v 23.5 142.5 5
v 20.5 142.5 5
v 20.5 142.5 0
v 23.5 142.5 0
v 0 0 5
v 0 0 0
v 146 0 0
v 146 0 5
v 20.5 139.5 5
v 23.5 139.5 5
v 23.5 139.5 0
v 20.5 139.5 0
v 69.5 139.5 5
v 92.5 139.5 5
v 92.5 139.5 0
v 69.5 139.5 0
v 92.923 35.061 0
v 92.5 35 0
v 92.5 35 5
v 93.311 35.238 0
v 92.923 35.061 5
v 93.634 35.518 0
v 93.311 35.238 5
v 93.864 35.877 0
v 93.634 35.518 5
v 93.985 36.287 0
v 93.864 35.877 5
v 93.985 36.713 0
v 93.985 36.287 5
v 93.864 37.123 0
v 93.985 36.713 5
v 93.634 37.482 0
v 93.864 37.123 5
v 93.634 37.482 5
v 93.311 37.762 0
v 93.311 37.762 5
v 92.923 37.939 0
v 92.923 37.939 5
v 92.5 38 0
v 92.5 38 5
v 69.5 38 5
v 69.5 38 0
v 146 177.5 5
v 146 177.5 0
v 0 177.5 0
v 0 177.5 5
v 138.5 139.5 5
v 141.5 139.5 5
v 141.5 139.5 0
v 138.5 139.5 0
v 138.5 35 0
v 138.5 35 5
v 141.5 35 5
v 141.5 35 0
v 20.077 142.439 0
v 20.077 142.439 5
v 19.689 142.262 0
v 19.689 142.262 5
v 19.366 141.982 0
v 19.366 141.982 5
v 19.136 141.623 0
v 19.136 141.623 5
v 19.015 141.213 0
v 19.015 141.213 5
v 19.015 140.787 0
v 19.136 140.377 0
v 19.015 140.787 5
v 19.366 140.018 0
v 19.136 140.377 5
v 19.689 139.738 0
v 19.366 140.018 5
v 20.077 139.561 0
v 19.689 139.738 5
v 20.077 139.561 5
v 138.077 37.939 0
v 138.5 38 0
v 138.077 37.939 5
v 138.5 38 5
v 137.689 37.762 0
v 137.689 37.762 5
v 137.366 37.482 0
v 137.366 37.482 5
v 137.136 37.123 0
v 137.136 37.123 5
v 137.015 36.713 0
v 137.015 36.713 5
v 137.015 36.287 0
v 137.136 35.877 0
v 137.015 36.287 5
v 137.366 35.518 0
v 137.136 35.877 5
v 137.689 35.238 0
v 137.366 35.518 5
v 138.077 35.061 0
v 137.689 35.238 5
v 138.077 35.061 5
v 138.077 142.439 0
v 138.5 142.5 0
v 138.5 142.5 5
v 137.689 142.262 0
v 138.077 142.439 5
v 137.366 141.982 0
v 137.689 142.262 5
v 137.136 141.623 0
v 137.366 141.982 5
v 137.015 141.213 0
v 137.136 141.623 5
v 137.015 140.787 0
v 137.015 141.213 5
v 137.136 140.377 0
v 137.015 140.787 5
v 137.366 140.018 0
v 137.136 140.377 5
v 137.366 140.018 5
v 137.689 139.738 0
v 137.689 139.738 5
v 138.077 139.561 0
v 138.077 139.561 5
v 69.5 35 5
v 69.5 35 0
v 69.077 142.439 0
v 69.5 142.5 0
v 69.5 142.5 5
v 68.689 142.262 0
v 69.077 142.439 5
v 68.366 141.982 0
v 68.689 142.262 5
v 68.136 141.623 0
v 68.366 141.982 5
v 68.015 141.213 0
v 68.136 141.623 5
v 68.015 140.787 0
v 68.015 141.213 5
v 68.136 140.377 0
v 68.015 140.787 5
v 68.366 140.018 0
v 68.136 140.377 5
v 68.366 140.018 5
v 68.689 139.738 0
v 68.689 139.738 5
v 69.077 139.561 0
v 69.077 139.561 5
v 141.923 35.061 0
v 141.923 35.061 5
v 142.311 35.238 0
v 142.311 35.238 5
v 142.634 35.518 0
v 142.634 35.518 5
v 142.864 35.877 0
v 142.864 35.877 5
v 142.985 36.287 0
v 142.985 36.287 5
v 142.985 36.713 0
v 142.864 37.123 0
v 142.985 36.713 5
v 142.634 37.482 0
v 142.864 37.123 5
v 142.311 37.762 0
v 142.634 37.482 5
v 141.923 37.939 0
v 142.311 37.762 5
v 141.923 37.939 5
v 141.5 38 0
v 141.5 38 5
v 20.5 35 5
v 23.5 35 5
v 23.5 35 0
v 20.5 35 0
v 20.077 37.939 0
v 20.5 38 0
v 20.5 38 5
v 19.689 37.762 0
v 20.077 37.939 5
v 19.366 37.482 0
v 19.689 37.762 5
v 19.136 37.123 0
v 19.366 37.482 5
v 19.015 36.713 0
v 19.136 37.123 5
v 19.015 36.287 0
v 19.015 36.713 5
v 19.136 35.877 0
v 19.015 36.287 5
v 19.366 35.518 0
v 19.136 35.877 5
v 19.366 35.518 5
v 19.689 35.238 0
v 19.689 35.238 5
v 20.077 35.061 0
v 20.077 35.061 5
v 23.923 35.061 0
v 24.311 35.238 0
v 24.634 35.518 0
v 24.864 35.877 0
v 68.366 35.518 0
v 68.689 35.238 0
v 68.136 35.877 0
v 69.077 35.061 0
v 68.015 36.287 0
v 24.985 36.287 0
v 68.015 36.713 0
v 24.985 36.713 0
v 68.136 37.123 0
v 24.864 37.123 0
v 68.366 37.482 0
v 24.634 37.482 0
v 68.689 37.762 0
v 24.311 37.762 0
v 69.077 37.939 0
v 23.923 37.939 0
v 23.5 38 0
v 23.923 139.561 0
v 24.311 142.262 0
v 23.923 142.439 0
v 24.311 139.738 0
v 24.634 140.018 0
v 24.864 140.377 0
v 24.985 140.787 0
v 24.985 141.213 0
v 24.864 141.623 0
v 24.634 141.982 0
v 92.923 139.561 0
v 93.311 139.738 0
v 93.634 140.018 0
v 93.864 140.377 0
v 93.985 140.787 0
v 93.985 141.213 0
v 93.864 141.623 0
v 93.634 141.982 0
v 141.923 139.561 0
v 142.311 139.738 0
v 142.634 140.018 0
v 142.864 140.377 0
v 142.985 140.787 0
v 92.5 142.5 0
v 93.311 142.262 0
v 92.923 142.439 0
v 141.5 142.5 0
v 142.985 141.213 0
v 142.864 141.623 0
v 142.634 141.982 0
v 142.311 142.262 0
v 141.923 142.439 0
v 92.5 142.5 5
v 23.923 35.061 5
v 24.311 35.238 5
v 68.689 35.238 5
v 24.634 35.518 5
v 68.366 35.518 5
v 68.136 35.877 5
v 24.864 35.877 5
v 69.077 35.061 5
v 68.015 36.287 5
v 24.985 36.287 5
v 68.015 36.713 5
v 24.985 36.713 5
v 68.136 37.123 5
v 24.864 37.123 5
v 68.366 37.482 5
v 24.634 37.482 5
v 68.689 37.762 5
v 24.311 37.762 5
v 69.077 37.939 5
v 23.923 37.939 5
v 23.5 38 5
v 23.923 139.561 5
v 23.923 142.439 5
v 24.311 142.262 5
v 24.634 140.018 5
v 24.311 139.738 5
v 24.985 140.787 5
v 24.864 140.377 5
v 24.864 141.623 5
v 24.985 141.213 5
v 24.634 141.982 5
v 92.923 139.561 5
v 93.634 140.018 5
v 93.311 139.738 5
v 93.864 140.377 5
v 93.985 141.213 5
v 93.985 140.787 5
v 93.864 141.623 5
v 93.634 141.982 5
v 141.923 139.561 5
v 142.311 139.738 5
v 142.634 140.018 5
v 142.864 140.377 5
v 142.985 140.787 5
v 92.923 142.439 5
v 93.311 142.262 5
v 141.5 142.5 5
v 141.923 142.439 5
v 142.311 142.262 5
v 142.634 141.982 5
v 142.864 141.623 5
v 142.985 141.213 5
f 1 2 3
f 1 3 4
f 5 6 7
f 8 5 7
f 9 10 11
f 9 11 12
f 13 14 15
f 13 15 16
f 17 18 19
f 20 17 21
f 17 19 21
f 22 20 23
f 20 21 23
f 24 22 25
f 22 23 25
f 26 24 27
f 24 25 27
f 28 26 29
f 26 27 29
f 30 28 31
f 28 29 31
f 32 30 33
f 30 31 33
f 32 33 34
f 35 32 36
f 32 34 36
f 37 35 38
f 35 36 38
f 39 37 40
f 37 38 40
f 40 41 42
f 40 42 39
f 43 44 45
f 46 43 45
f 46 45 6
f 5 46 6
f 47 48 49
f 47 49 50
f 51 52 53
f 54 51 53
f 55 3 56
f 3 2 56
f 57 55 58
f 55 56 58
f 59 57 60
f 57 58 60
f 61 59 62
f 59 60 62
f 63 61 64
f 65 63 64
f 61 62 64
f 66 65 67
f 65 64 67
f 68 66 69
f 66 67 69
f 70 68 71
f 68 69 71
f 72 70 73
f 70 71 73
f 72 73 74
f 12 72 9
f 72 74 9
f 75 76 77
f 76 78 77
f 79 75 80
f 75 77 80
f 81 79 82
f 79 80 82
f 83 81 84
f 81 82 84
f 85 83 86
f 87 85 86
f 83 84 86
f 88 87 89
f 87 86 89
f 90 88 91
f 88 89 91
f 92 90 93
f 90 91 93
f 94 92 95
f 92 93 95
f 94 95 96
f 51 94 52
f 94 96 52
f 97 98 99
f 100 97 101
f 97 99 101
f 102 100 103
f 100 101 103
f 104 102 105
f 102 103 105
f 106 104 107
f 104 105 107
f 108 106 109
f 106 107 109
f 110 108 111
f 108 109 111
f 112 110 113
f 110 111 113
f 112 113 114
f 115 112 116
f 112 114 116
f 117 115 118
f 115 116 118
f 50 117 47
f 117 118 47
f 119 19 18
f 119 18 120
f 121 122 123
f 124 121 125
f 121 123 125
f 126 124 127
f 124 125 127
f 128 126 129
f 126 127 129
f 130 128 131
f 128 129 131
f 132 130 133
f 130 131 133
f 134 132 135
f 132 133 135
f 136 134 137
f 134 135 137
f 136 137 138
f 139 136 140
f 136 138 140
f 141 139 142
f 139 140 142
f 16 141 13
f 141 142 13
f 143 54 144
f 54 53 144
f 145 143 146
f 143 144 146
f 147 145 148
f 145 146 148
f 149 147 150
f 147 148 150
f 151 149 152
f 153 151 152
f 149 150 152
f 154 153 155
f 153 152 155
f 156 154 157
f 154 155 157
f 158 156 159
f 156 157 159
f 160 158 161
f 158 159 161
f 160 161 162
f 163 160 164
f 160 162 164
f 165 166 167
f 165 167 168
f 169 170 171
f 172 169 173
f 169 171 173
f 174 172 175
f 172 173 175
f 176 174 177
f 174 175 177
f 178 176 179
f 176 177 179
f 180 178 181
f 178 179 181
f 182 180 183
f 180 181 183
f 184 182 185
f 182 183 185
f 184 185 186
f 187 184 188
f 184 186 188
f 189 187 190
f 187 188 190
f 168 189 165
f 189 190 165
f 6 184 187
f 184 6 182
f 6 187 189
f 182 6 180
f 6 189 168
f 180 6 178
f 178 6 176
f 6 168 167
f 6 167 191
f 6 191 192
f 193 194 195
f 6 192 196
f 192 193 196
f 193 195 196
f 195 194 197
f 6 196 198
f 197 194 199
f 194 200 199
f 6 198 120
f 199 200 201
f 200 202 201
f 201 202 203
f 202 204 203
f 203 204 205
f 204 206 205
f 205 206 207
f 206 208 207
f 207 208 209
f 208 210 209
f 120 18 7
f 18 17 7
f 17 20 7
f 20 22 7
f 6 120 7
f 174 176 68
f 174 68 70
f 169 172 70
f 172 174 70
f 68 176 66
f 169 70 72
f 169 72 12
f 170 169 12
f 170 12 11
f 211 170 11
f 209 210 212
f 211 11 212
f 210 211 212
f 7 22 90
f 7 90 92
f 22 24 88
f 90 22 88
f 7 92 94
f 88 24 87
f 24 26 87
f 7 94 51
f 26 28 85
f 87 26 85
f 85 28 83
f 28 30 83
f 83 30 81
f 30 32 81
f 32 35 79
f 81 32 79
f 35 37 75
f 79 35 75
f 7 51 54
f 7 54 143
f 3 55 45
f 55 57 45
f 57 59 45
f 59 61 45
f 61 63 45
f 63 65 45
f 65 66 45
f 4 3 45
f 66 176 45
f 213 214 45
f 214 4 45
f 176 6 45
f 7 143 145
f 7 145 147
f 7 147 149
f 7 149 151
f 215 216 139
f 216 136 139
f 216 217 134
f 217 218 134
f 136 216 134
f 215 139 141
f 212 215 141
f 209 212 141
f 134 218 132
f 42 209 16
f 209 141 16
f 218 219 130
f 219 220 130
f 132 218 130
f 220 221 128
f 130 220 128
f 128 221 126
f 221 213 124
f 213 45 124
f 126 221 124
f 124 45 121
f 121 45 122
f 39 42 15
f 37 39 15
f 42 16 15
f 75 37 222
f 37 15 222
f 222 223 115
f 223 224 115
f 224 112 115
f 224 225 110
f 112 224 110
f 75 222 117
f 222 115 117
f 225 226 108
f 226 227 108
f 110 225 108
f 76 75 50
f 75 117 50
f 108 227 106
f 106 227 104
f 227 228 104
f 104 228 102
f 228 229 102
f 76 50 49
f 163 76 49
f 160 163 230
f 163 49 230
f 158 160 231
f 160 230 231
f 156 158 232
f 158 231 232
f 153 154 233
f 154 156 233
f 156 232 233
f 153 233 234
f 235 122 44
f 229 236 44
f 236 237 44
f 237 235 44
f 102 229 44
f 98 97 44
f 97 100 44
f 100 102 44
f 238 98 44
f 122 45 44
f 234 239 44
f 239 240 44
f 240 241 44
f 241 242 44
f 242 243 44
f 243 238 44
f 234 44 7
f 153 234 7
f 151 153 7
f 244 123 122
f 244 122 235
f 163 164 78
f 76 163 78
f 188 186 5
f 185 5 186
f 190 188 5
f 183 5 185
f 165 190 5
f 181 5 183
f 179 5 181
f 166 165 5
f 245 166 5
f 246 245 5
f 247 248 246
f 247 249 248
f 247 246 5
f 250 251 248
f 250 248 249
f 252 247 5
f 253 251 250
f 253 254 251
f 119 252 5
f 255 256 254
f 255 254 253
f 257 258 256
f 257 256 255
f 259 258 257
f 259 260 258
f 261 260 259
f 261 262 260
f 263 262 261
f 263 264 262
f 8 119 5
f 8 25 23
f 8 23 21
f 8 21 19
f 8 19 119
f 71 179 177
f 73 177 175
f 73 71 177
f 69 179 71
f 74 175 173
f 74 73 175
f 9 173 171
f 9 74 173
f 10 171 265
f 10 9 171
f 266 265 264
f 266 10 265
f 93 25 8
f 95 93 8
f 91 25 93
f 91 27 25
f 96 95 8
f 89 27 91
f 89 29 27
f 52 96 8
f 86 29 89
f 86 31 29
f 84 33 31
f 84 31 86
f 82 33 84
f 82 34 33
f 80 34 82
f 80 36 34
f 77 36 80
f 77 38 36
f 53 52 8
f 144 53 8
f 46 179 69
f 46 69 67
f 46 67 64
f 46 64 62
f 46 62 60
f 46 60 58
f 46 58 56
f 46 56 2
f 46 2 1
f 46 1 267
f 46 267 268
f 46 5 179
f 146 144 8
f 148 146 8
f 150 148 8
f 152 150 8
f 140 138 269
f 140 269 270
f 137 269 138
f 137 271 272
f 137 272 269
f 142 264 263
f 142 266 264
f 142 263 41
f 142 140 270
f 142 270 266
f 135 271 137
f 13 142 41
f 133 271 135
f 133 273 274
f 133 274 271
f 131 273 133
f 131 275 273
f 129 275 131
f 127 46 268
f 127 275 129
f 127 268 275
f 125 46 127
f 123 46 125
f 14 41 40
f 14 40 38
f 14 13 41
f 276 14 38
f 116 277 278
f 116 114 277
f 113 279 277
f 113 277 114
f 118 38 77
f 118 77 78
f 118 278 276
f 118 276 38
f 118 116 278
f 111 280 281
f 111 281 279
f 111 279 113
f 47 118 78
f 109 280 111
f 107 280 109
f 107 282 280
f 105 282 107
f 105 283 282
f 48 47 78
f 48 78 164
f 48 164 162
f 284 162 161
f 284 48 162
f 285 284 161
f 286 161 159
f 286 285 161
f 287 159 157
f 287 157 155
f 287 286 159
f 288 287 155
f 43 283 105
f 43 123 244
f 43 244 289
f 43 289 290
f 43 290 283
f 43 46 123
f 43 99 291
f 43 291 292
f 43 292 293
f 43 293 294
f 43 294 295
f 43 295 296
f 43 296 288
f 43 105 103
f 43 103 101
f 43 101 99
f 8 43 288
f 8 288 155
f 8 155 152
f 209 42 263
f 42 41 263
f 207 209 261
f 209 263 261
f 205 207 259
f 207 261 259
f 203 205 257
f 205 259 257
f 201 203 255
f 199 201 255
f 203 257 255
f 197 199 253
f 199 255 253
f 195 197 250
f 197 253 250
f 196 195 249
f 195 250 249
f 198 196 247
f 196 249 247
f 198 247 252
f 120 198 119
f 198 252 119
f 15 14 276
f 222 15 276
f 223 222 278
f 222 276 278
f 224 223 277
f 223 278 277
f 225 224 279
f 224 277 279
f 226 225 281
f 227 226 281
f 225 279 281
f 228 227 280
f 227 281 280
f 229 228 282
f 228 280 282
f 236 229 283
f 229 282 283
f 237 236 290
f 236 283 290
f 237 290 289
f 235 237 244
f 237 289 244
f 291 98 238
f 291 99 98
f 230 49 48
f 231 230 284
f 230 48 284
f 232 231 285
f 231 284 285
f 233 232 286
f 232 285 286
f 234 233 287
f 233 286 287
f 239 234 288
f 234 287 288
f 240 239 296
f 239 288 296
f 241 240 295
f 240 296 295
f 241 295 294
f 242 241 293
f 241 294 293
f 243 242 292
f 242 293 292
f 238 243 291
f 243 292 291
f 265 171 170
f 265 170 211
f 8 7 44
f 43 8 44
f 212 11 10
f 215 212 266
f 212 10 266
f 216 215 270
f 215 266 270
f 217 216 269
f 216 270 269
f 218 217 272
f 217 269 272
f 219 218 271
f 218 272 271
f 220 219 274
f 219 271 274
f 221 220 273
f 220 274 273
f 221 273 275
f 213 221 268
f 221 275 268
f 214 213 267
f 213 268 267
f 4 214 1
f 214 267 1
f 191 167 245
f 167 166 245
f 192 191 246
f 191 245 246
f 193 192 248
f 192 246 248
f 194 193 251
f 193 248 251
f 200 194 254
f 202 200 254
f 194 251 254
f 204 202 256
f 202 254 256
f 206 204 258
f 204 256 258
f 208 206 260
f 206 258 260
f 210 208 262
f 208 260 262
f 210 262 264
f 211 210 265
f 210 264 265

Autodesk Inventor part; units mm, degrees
ref_plane "YZ Plane" through (0, 0, 0) normal (1, 0, 0) x (0, 1, 0)
ref_plane "XZ Plane" through (0, 0, 0) normal (0, 1, 0) x (-1, 0, 0)
ref_plane "XY Plane" through (0, 0, 0) normal (0, 0, 1) x (1, 0, 0)
sketch "Sketch1" plane through (0, 0, 0) normal (0, 0, 1) x (1, 0, 0)
  line L0 (0, 0) -> (146, 0)
  line L1 (146, 0) -> (146, 177.5)
  line L2 (146, 177.5) -> (0, 177.5)
  line L3 (0, 177.5) -> (0, 0)
  dimension "d0" = 146
  dimension "d1" = 177.5
extrude "Extrusion1" add sketch "Sketch1" along normal blind 5
sketch "Sketch3" plane through (0, 0, 5) normal (0, 0, 1) x (1, 0, 0)
  line L0 (0, 0) -> (146, 0) projected
  line L1 (146, 0) -> (146, 177.5) projected
  line L2 (146, 177.5) -> (0, 177.5) projected
  line L3 (0, 177.5) -> (0, 0) projected
  line L4 (0, 141) -> (146, 141) construction
  line L5 (0, 36.5) -> (146, 36.5) construction
  line L6 (22, 177.5) -> (22, 0) construction
  line L7 (81, 0) -> (81, 177.5) construction
  line L8 (140, 177.5) -> (140, 0) construction
  line L9 (20.5, 142.5) -> (23.5, 142.5)
  line L10 (25, 141) -> (25, 141)
  line L11 (23.5, 139.5) -> (20.5, 139.5)
  line L12 (19, 141) -> (19, 141)
  line L13 (19, 142.5) -> (25, 139.5) construction
  line L14 (25, 142.5) -> (19, 139.5) construction
  line L15 (20.5, 38) -> (23.5, 38)
  line L16 (25, 36.5) -> (25, 36.5)
  line L17 (23.5, 35) -> (20.5, 35)
  line L18 (19, 36.5) -> (19, 36.5)
  line L19 (19, 38) -> (25, 35) construction
  line L20 (25, 38) -> (19, 35) construction
  line L21 (138.5, 142.5) -> (141.5, 142.5)
  line L22 (143, 141) -> (143, 141)
  line L23 (141.5, 139.5) -> (138.5, 139.5)
  line L24 (137, 141) -> (137, 141)
  line L25 (137, 142.5) -> (143, 139.5) construction
  line L26 (143, 142.5) -> (137, 139.5) construction
  line L27 (141.5, 38) -> (138.5, 38)
  line L28 (137, 36.5) -> (137, 36.5)
  line L29 (138.5, 35) -> (141.5, 35)
  line L30 (143, 36.5) -> (143, 36.5)
  line L31 (143, 38) -> (137, 35) construction
  line L32 (137, 38) -> (143, 35) construction
  arc A0 (20.5, 142.5) -> (19, 141) centre (20.5, 141) ccw
  arc A1 (25, 141) -> (23.5, 142.5) centre (23.5, 141) ccw
  arc A2 (23.5, 139.5) -> (25, 141) centre (23.5, 141) ccw
  arc A3 (19, 141) -> (20.5, 139.5) centre (20.5, 141) ccw
  arc A4 (20.5, 38) -> (19, 36.5) centre (20.5, 36.5) ccw
  arc A5 (25, 36.5) -> (23.5, 38) centre (23.5, 36.5) ccw
  arc A6 (23.5, 35) -> (25, 36.5) centre (23.5, 36.5) ccw
  arc A7 (19, 36.5) -> (20.5, 35) centre (20.5, 36.5) ccw
  arc A8 (141.5, 35) -> (143, 36.5) centre (141.5, 36.5) ccw
  arc A9 (137, 36.5) -> (138.5, 35) centre (138.5, 36.5) ccw
  arc A10 (138.5, 38) -> (137, 36.5) centre (138.5, 36.5) ccw
  arc A11 (143, 36.5) -> (141.5, 38) centre (141.5, 36.5) ccw
  arc A12 (138.5, 142.5) -> (137, 141) centre (138.5, 141) ccw
  arc A13 (137, 141) -> (138.5, 139.5) centre (138.5, 141) ccw
  arc A14 (143, 141) -> (141.5, 142.5) centre (141.5, 141) ccw
  arc A15 (141.5, 139.5) -> (143, 141) centre (141.5, 141) ccw
  line L33 (69.5, 142.5) -> (92.5, 142.5)
  line L34 (94, 141) -> (94, 141)
  line L35 (92.5, 139.5) -> (69.5, 139.5)
  line L36 (68, 141) -> (68, 141)
  line L37 (68, 142.5) -> (94, 139.5) construction
  line L38 (94, 142.5) -> (68, 139.5) construction
  line L39 (69.5, 38) -> (92.5, 38)
  line L40 (94, 36.5) -> (94, 36.5)
  line L41 (92.5, 35) -> (69.5, 35)
  line L42 (68, 36.5) -> (68, 36.5)
  line L43 (68, 38) -> (94, 35) construction
  line L44 (94, 38) -> (68, 35) construction
  arc A16 (69.5, 142.5) -> (68, 141) centre (69.5, 141) ccw
  arc A17 (68, 141) -> (69.5, 139.5) centre (69.5, 141) ccw
  arc A18 (92.5, 139.5) -> (94, 141) centre (92.5, 141) ccw
  arc A19 (94, 141) -> (92.5, 142.5) centre (92.5, 141) ccw
  arc A20 (69.5, 38) -> (68, 36.5) centre (69.5, 36.5) ccw
  arc A21 (68, 36.5) -> (69.5, 35) centre (69.5, 36.5) ccw
  arc A22 (92.5, 35) -> (94, 36.5) centre (92.5, 36.5) ccw
  arc A23 (94, 36.5) -> (92.5, 38) centre (92.5, 36.5) ccw
  point P0 (22, 141)
  point P1 (22, 36.5)
  point P2 (81, 36.5)
  point P3 (81, 141)
  point P4 (140, 141)
  point P5 (140, 36.5)
  dimension "d22" = 36.5
  dimension "d23" = 36.5
  dimension "d24" = 104.5
  dimension "d25" = 59
  dimension "d26" = 59
  dimension "d36" = 22
  dimension "d39" = 3
  dimension "d40" = 6
  dimension "d41" = 1.5
  dimension "d42" = 1.5
  dimension "d43" = 1.5
  dimension "d44" = 1.5
  dimension "d47" = 26
  dimension "d48" = 26
  dimension "d49" = 3
  dimension "d50" = 3
  dimension "d51" = 1.5
  dimension "d52" = 1.5
extrude "Extrusion4" cut sketch "Sketch3" against normal blind 10 contours L9 A1 A2 L11 A3 A0 | L15 A5 A6 L17 A7 A4 | L21 A14 A15 L23 A13 A12 | A11 A8 L29 A9 A10 L27 | L33 A19 A18 L35 A17 A16 | L39 A23 A22 L41 A21 A20
ref_plane "Work Plane1" through (81, 38, 5) normal (1, 0, 0) x (0, 0, -1)
ref_plane "Work Plane2" through (69.5, 88.75, 5) normal (0, -1, 0) x (1, 0, 0)
properties part number "plate_base" material "Aluminum 6061-AHC"
